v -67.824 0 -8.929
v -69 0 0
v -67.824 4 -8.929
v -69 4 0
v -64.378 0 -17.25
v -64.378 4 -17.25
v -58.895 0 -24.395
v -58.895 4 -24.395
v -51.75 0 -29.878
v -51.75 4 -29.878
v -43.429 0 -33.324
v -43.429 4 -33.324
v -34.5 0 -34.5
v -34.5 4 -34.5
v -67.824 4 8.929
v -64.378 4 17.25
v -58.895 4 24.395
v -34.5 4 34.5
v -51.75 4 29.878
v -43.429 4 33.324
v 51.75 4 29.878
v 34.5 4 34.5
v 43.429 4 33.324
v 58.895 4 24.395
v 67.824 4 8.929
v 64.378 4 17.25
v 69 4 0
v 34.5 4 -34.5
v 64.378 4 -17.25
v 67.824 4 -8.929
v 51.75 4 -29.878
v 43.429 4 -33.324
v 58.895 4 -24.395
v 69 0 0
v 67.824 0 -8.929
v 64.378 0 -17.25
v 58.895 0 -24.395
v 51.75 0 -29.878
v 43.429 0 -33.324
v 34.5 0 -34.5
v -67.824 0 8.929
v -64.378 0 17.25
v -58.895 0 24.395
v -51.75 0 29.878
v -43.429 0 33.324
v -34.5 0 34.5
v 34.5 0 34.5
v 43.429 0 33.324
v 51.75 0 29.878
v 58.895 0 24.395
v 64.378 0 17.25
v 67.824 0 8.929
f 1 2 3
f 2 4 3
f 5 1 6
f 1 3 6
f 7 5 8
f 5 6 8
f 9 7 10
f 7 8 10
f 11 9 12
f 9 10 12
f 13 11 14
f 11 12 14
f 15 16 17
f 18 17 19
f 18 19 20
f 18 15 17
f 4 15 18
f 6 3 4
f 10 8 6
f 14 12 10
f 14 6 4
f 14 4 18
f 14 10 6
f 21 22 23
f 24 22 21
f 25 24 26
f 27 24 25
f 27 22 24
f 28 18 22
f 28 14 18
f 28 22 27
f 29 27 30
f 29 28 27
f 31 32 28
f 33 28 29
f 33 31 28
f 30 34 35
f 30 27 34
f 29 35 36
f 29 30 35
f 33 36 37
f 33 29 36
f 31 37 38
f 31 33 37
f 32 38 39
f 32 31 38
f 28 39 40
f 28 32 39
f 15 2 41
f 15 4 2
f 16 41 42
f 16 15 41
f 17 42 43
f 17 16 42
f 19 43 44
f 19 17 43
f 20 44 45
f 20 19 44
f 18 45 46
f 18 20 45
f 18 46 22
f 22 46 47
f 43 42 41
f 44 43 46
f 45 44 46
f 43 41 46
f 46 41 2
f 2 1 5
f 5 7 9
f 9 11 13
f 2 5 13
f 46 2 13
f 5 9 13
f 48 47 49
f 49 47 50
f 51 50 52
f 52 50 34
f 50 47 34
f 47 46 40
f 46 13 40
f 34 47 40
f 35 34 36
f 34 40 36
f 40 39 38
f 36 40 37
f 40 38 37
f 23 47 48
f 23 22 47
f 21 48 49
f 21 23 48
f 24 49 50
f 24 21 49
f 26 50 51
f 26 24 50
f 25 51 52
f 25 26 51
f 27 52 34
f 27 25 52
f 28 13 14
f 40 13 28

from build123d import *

# Parameters (mm, degrees)
SKETCH1_W           = 138
SKETCH1_H           = 69
BOSS_EXTRUDE1_DEPTH = 4
FILLET1_R           = 34.5


with BuildPart() as part:
    # Sketch1 → Boss-Extrude1 (new body)
    with BuildSketch(Plane(origin=(0, 0, 0), x_dir=(1, 0, 0), z_dir=(0, 1, 0))):
        Rectangle(SKETCH1_W, SKETCH1_H)
    extrude(amount=BOSS_EXTRUDE1_DEPTH)

    # Fillet1
    fillet1_edges = [part.edges().sort_by_distance(p)[0] for p in [
        (69, 2, 34.5),
        (69, 2, -34.5),
        (-69, 2, -34.5),
        (-69, 2, 34.5),
    ]]
    fillet(fillet1_edges, radius=FILLET1_R - 0.0001)  # a hair under: the kernel refuses the full size


solid = part.part
